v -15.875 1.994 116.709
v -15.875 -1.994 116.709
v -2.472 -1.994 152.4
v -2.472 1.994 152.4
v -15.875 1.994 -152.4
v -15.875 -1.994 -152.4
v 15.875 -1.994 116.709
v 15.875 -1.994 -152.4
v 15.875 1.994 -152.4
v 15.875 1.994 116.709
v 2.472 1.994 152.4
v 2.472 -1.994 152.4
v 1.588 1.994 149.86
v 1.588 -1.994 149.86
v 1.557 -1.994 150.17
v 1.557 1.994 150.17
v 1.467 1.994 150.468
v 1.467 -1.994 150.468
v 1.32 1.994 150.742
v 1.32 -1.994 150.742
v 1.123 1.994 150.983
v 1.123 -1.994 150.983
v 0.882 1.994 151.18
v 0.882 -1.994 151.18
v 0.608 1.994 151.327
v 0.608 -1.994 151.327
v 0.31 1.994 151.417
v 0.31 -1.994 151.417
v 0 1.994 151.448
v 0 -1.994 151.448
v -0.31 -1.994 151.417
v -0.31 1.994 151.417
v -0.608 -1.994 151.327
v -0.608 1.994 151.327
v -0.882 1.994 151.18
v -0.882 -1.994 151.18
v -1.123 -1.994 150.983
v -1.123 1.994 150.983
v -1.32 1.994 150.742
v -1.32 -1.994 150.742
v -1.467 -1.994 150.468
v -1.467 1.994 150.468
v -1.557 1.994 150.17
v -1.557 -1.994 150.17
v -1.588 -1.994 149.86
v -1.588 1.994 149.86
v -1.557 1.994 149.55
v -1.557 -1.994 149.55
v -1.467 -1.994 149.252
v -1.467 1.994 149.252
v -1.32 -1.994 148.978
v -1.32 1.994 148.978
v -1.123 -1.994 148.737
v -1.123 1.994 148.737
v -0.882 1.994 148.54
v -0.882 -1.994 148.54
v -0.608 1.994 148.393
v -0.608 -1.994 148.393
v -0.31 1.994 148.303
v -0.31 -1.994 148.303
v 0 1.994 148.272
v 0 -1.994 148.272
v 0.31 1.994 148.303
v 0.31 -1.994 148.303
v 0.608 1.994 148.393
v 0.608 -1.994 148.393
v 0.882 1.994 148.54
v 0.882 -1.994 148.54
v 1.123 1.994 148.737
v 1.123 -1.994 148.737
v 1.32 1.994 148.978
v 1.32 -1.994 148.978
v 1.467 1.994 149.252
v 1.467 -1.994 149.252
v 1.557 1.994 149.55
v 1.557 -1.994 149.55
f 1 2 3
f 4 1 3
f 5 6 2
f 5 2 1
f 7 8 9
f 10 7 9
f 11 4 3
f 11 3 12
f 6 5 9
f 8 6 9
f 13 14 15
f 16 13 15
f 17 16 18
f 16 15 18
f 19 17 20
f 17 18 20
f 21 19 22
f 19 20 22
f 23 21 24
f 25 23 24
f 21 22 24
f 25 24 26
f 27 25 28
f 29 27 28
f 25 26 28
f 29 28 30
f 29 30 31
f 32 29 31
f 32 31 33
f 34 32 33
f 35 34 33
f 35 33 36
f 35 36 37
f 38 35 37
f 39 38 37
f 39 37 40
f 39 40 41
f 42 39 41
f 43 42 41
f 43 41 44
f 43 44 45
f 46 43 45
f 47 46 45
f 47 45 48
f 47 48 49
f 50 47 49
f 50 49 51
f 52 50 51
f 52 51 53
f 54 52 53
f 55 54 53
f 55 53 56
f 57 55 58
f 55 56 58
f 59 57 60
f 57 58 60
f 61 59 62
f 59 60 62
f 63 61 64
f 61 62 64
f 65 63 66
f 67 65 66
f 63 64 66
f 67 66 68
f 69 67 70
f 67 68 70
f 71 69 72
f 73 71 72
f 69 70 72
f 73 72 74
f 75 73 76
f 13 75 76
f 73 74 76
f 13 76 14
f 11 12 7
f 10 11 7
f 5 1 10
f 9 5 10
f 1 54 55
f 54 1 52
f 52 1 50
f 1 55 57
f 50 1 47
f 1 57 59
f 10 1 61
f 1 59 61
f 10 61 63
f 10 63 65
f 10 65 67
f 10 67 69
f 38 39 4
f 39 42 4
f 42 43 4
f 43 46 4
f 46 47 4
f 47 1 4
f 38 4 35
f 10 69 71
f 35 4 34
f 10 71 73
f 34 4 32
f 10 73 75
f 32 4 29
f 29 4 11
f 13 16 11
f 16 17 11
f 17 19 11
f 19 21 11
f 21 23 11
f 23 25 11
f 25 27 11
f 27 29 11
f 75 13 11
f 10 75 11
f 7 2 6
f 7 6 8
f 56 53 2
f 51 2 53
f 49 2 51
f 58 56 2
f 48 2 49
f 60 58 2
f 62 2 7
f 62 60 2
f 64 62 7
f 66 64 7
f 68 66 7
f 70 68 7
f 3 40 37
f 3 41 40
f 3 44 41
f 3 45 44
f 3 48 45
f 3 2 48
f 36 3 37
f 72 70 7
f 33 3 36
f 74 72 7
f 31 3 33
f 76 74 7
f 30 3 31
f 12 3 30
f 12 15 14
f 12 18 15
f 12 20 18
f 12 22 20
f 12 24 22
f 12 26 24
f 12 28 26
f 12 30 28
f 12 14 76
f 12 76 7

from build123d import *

# Parameters (mm, degrees)
F0_W     = 31.75
F0_H     = 3.9878
F1_DEPTH = 152.4
F2_R     = 1.5875
F3_DEPTH = 3.9888


with BuildPart() as f1:
    # F0 (on Top) → F1 (new body, symmetric)
    with BuildSketch(Plane.XY):
        Rectangle(F0_W, F0_H)
    extrude(amount=F1_DEPTH, both=True)

    # F2 (on face) → F3 (cut, through all)
    with BuildSketch(Plane.XZ.offset(1.9939)):
        with Locations((0, 149.86)):
            Circle(F2_R)
        Polygon((-15.875, 116.70918), (-2.472009, 152.4), (-15.875, 152.4), align=None)
        Polygon((15.875, 152.4), (2.472009, 152.4), (15.875, 116.70918), align=None)
    extrude(amount=-F3_DEPTH, mode=Mode.SUBTRACT)


solid = f1.part
